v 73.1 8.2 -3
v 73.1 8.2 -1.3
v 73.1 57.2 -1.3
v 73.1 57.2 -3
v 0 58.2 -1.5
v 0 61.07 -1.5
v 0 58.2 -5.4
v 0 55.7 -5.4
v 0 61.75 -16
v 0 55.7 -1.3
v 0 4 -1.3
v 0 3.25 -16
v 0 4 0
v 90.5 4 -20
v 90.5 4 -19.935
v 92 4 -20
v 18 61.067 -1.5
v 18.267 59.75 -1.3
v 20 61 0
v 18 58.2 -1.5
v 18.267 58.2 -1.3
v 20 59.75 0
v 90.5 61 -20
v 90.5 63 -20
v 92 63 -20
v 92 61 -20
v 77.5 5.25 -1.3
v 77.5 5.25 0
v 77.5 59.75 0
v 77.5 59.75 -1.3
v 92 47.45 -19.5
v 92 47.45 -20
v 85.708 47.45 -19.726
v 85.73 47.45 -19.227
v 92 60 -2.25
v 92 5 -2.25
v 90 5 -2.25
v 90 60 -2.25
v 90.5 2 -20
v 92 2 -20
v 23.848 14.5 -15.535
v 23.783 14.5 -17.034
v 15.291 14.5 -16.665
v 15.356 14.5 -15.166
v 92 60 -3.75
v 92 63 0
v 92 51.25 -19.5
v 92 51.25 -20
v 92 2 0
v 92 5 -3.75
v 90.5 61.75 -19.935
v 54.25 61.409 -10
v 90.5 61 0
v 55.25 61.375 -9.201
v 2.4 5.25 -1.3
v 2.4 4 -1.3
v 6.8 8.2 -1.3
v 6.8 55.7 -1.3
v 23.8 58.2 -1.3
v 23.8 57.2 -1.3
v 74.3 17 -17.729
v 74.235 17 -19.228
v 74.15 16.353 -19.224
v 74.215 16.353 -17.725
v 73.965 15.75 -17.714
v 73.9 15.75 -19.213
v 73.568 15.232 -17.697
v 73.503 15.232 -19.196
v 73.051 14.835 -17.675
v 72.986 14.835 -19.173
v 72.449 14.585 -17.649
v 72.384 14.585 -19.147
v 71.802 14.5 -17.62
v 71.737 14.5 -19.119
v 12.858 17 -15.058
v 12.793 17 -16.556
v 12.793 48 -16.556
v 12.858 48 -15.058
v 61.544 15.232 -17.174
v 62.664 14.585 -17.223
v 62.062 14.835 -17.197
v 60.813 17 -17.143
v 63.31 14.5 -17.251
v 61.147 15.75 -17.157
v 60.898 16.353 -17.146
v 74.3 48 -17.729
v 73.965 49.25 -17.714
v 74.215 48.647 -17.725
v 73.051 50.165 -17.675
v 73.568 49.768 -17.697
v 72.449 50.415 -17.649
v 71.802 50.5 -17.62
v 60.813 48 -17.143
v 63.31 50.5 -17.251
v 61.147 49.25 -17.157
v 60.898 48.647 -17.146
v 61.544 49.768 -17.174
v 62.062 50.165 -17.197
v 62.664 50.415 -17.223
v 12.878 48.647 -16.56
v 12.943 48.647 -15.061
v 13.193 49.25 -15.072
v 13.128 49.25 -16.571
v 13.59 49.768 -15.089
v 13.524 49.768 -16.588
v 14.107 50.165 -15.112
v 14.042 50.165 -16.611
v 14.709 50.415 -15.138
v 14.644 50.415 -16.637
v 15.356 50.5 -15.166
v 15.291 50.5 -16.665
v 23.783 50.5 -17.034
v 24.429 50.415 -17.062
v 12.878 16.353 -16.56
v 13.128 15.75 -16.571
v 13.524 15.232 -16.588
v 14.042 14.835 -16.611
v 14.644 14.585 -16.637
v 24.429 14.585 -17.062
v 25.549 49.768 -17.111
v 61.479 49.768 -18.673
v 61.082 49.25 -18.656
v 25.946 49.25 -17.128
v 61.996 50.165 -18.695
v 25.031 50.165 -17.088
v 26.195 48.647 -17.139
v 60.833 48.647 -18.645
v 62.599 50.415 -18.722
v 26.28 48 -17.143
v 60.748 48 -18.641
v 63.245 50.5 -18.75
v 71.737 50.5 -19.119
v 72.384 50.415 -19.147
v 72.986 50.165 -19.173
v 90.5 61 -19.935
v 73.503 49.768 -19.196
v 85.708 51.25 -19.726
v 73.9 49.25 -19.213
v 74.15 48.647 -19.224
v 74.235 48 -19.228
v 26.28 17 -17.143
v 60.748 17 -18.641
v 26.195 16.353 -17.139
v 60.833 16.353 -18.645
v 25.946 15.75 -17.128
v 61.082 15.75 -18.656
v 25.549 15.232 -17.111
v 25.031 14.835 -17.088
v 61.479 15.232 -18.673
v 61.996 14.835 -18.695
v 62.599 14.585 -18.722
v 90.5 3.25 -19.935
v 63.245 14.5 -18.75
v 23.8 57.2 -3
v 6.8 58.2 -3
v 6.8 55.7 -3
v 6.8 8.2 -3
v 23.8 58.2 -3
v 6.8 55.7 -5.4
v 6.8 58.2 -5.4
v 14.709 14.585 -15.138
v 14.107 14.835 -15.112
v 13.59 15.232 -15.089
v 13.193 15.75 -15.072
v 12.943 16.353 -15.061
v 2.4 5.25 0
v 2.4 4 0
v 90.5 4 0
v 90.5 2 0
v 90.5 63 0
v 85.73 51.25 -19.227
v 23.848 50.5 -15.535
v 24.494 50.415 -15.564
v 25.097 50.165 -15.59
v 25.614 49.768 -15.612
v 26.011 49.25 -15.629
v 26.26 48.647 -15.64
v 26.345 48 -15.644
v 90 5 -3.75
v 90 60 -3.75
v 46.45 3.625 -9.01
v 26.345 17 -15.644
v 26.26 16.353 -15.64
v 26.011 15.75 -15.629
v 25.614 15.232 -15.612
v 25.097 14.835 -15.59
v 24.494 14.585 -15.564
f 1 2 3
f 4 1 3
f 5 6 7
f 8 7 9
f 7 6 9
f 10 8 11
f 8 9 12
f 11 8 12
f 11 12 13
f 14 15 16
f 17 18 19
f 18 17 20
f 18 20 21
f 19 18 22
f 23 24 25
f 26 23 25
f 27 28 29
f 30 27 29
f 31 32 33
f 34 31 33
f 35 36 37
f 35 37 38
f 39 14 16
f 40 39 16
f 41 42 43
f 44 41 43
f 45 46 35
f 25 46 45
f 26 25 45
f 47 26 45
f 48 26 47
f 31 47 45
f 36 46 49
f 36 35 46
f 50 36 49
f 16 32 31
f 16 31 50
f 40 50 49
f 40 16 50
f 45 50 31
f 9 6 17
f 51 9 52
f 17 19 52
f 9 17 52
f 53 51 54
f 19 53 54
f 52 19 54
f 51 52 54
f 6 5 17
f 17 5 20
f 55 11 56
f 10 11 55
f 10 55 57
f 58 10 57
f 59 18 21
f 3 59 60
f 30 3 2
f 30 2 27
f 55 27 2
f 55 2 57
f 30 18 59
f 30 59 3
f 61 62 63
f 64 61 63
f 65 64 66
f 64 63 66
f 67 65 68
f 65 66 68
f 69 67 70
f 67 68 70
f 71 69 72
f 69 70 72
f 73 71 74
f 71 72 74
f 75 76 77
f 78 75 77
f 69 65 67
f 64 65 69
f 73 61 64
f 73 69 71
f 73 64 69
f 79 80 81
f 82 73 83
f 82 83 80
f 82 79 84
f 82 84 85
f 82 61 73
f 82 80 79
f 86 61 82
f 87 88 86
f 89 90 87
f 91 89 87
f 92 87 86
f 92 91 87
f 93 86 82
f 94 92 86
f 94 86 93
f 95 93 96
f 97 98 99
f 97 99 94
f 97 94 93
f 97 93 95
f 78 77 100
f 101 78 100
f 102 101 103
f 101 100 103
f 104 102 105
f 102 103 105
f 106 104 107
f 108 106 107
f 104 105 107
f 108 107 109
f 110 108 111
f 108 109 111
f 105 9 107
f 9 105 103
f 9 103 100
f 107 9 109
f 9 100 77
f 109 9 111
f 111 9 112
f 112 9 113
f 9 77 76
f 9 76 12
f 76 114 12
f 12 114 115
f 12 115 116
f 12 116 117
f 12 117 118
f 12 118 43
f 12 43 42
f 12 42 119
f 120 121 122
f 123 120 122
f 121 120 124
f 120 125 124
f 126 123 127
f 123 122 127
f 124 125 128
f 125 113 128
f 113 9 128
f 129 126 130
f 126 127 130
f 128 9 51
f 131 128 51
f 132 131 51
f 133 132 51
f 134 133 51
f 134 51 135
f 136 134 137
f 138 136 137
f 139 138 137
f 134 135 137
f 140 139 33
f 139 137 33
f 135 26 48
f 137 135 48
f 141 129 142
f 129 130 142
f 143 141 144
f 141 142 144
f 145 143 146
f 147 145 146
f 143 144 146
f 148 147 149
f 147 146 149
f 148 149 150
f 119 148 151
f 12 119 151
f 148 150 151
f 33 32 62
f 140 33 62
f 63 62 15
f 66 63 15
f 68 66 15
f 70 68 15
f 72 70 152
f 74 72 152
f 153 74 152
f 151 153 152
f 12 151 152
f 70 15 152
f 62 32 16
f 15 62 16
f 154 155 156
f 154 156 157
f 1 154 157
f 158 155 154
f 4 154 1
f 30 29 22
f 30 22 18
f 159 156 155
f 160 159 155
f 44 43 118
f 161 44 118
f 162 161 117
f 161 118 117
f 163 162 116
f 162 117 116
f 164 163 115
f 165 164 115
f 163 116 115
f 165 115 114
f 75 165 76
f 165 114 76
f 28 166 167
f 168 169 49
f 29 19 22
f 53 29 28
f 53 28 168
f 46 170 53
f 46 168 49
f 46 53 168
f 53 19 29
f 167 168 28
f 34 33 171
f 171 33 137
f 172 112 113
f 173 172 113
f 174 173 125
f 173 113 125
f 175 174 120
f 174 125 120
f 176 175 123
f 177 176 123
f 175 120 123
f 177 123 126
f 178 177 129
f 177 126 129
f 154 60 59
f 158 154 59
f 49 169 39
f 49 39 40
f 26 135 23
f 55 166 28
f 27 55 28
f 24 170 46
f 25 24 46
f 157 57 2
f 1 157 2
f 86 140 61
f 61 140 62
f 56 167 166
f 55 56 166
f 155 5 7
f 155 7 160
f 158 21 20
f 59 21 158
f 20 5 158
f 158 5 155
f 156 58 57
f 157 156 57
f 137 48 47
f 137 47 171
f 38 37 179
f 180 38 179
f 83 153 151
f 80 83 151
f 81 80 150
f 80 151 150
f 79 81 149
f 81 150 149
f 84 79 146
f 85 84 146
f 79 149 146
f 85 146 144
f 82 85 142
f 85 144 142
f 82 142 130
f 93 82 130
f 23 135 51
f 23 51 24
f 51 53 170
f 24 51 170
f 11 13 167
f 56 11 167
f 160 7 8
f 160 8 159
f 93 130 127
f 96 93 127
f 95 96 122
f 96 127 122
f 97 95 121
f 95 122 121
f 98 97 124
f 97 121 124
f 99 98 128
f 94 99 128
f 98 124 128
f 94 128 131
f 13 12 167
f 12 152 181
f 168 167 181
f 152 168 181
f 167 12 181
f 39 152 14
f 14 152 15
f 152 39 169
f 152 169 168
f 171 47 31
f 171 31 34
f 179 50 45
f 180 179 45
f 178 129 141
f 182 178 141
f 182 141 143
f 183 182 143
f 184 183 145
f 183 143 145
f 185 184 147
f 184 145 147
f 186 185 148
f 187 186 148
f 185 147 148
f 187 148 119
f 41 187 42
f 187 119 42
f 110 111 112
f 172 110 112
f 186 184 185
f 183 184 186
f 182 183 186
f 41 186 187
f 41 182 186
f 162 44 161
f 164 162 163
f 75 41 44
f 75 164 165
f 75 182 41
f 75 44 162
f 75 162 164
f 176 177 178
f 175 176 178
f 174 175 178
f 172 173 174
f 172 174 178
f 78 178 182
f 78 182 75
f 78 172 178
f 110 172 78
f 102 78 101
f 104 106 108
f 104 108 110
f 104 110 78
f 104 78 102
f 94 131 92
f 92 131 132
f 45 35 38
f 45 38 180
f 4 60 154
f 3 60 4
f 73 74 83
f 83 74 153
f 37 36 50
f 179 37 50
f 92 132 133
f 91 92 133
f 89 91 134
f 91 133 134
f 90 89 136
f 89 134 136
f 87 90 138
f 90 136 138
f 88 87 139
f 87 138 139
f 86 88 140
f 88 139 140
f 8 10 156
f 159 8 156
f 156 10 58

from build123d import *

# Parameters (mm, degrees)
SKETCH6_W               = 17
SKETCH6_H               = 1
SKETCH6_W_2             = 66.3
SKETCH6_H_2             = 49
FILM_PLANE_DEPTH        = 3
CUT_EXTRUDE2_DEPTH      = 1.3
NOTCH_W                 = 6.8
NOTCH_H                 = 2.5
NOTCH_CUT_DEPTH         = 4.1
SKETCH10_W              = 6.297854397
SKETCH10_H              = 3.8
CUT_EXTRUDE4_DEPTH      = 0.5
CUT_EXTRUDE5_DEPTH      = 1.5
CUT_EXTRUDE6_DEPTH      = 111.449366381
CUT_EXTRUDE6_DEPTH_BACK = 5
SKETCH_1_W              = 1.5
SKETCH_1_H              = 55
OUTLET_DEPTH            = 2
SKETCH_6_W              = 1.5
SKETCH_6_H              = 2
EXTRUDE_1_DEPTH         = 20


with BuildPart() as part:
    # Sketch3 → body section 0
    with BuildSketch(Plane(origin=(0, 0, 0), x_dir=(0, 0, -1), z_dir=(1, 0, 0))):
        with BuildLine():
            Line((0, 61), (16, 61.75))
            Line((16, 61.75), (16, 3.25))
            Line((16, 3.25), (0, 4))
            Line((0, 4), (0, 61))
        make_face()
    # Sketch2 → body section 1
    with BuildSketch(Plane(origin=(92, 0, 0), x_dir=(0, 0, -1), z_dir=(1, 0, 0))):
        with BuildLine():
            Line((0, 61), (20, 61.75))
            Line((20, 61.75), (20, 3.25))
            Line((20, 3.25), (0, 4))
            Line((0, 4), (0, 61))
        make_face()
    loft()

    # Sketch6 → film plane (cut)
    with BuildSketch(Plane.XY):
        with Locations((15.3, 57.7)):
            Rectangle(SKETCH6_W, SKETCH6_H)
        with Locations((39.95, 32.7)):
            Rectangle(SKETCH6_W_2, SKETCH6_H_2)
    extrude(amount=-FILM_PLANE_DEPTH, mode=Mode.SUBTRACT)

    # Sketch7 → Cut-Extrude2 (cut)
    with BuildSketch(Plane.XY):
        Polygon((77.5, 5.25), (77.5, 59.75), (0, 59.75), (0, 4), (2.4, 4), (2.4, 5.25), align=None)
        Polygon((23.8, 58.2), (23.8, 57.2), (73.1, 57.2), (73.1, 8.2), (6.8, 8.2), (6.8, 58.2), align=None, mode=Mode.SUBTRACT)
    extrude(amount=-CUT_EXTRUDE2_DEPTH, mode=Mode.SUBTRACT)

    # notch → notch-cut (cut)
    with BuildSketch(Plane.XY.offset(-1.3)):
        with Locations((3.4, 56.95)):
            Rectangle(NOTCH_W, NOTCH_H)
    extrude(amount=-NOTCH_CUT_DEPTH, mode=Mode.SUBTRACT)

    # Sketch10 → Cut-Extrude4 (cut)
    with BuildSketch(Plane(origin=(-0.694339623, 0, -15.969811321), x_dir=(-0.9990561583550596, 0, 0.04343722427630701), z_dir=(-0.043437224276307015, 0, -0.9990561583550597))):
        with Locations((-89.632983856, 49.35)):
            Rectangle(SKETCH10_W, SKETCH10_H)
    extrude(amount=-CUT_EXTRUDE4_DEPTH, mode=Mode.SUBTRACT)

    # Sketch11 → Cut-Extrude5 (cut)
    with BuildSketch(Plane(origin=(-0.694339623, 0, -15.969811321), x_dir=(-0.9990561583550596, 0, 0.04343722427630701), z_dir=(-0.043437224276307015, 0, -0.9990561583550597))):
        with BuildLine():
            Line((-72.5, 14.5), (-64, 14.5))
            ThreePointArc((-64, 14.5), (-62.232233047, 15.232233047), (-61.5, 17))
            Line((-61.5, 17), (-61.5, 48))
            ThreePointArc((-61.5, 48), (-62.232233047, 49.767766953), (-64, 50.5))
            Line((-64, 50.5), (-72.5, 50.5))
            ThreePointArc((-72.5, 50.5), (-74.267766953, 49.767766953), (-75, 48))
            Line((-75, 48), (-75, 17))
            ThreePointArc((-75, 17), (-74.267766953, 15.232233047), (-72.5, 14.5))
        make_face()
        with BuildLine():
            Line((-24.5, 14.5), (-16, 14.5))
            ThreePointArc((-16, 14.5), (-14.232233047, 15.232233047), (-13.5, 17))
            Line((-13.5, 17), (-13.5, 48))
            ThreePointArc((-13.5, 48), (-14.232233047, 49.767766953), (-16, 50.5))
            Line((-16, 50.5), (-24.5, 50.5))
            ThreePointArc((-24.5, 50.5), (-26.267766953, 49.767766953), (-27, 48))
            Line((-27, 48), (-27, 17))
            ThreePointArc((-27, 17), (-26.267766953, 15.232233047), (-24.5, 14.5))
        make_face()
    extrude(amount=-CUT_EXTRUDE5_DEPTH, mode=Mode.SUBTRACT)

    # Sketch5 → Cut-Extrude6 (cut, two sides: drawn at the far end of the back side and taken through both)
    with BuildSketch(Plane(origin=(0, 61, 0), x_dir=(1, 0, 0), z_dir=(0, 1, 0)).offset(-CUT_EXTRUDE6_DEPTH_BACK)):
        Polygon((0, 1.5), (18, 1.5), (20, 0), (0, 0), align=None)
    extrude(amount=CUT_EXTRUDE6_DEPTH + CUT_EXTRUDE6_DEPTH_BACK, mode=Mode.SUBTRACT)

    # 草图1 → outlet (cut)
    with BuildSketch(Plane(origin=(92, 0, 0), x_dir=(0, 0, -1), z_dir=(1, 0, 0))):
        with Locations((3, 32.5)):
            Rectangle(SKETCH_1_W, SKETCH_1_H)
    extrude(amount=-OUTLET_DEPTH, mode=Mode.SUBTRACT)

    # 草图6 → 凸台-拉伸1 (add)
    with BuildSketch(Plane.XY):
        with Locations((91.25, 62)):
            Rectangle(SKETCH_6_W, SKETCH_6_H)
        with Locations((91.25, 3)):
            Rectangle(SKETCH_6_W, SKETCH_6_H)
    extrude(amount=-EXTRUDE_1_DEPTH)


solid = part.part
